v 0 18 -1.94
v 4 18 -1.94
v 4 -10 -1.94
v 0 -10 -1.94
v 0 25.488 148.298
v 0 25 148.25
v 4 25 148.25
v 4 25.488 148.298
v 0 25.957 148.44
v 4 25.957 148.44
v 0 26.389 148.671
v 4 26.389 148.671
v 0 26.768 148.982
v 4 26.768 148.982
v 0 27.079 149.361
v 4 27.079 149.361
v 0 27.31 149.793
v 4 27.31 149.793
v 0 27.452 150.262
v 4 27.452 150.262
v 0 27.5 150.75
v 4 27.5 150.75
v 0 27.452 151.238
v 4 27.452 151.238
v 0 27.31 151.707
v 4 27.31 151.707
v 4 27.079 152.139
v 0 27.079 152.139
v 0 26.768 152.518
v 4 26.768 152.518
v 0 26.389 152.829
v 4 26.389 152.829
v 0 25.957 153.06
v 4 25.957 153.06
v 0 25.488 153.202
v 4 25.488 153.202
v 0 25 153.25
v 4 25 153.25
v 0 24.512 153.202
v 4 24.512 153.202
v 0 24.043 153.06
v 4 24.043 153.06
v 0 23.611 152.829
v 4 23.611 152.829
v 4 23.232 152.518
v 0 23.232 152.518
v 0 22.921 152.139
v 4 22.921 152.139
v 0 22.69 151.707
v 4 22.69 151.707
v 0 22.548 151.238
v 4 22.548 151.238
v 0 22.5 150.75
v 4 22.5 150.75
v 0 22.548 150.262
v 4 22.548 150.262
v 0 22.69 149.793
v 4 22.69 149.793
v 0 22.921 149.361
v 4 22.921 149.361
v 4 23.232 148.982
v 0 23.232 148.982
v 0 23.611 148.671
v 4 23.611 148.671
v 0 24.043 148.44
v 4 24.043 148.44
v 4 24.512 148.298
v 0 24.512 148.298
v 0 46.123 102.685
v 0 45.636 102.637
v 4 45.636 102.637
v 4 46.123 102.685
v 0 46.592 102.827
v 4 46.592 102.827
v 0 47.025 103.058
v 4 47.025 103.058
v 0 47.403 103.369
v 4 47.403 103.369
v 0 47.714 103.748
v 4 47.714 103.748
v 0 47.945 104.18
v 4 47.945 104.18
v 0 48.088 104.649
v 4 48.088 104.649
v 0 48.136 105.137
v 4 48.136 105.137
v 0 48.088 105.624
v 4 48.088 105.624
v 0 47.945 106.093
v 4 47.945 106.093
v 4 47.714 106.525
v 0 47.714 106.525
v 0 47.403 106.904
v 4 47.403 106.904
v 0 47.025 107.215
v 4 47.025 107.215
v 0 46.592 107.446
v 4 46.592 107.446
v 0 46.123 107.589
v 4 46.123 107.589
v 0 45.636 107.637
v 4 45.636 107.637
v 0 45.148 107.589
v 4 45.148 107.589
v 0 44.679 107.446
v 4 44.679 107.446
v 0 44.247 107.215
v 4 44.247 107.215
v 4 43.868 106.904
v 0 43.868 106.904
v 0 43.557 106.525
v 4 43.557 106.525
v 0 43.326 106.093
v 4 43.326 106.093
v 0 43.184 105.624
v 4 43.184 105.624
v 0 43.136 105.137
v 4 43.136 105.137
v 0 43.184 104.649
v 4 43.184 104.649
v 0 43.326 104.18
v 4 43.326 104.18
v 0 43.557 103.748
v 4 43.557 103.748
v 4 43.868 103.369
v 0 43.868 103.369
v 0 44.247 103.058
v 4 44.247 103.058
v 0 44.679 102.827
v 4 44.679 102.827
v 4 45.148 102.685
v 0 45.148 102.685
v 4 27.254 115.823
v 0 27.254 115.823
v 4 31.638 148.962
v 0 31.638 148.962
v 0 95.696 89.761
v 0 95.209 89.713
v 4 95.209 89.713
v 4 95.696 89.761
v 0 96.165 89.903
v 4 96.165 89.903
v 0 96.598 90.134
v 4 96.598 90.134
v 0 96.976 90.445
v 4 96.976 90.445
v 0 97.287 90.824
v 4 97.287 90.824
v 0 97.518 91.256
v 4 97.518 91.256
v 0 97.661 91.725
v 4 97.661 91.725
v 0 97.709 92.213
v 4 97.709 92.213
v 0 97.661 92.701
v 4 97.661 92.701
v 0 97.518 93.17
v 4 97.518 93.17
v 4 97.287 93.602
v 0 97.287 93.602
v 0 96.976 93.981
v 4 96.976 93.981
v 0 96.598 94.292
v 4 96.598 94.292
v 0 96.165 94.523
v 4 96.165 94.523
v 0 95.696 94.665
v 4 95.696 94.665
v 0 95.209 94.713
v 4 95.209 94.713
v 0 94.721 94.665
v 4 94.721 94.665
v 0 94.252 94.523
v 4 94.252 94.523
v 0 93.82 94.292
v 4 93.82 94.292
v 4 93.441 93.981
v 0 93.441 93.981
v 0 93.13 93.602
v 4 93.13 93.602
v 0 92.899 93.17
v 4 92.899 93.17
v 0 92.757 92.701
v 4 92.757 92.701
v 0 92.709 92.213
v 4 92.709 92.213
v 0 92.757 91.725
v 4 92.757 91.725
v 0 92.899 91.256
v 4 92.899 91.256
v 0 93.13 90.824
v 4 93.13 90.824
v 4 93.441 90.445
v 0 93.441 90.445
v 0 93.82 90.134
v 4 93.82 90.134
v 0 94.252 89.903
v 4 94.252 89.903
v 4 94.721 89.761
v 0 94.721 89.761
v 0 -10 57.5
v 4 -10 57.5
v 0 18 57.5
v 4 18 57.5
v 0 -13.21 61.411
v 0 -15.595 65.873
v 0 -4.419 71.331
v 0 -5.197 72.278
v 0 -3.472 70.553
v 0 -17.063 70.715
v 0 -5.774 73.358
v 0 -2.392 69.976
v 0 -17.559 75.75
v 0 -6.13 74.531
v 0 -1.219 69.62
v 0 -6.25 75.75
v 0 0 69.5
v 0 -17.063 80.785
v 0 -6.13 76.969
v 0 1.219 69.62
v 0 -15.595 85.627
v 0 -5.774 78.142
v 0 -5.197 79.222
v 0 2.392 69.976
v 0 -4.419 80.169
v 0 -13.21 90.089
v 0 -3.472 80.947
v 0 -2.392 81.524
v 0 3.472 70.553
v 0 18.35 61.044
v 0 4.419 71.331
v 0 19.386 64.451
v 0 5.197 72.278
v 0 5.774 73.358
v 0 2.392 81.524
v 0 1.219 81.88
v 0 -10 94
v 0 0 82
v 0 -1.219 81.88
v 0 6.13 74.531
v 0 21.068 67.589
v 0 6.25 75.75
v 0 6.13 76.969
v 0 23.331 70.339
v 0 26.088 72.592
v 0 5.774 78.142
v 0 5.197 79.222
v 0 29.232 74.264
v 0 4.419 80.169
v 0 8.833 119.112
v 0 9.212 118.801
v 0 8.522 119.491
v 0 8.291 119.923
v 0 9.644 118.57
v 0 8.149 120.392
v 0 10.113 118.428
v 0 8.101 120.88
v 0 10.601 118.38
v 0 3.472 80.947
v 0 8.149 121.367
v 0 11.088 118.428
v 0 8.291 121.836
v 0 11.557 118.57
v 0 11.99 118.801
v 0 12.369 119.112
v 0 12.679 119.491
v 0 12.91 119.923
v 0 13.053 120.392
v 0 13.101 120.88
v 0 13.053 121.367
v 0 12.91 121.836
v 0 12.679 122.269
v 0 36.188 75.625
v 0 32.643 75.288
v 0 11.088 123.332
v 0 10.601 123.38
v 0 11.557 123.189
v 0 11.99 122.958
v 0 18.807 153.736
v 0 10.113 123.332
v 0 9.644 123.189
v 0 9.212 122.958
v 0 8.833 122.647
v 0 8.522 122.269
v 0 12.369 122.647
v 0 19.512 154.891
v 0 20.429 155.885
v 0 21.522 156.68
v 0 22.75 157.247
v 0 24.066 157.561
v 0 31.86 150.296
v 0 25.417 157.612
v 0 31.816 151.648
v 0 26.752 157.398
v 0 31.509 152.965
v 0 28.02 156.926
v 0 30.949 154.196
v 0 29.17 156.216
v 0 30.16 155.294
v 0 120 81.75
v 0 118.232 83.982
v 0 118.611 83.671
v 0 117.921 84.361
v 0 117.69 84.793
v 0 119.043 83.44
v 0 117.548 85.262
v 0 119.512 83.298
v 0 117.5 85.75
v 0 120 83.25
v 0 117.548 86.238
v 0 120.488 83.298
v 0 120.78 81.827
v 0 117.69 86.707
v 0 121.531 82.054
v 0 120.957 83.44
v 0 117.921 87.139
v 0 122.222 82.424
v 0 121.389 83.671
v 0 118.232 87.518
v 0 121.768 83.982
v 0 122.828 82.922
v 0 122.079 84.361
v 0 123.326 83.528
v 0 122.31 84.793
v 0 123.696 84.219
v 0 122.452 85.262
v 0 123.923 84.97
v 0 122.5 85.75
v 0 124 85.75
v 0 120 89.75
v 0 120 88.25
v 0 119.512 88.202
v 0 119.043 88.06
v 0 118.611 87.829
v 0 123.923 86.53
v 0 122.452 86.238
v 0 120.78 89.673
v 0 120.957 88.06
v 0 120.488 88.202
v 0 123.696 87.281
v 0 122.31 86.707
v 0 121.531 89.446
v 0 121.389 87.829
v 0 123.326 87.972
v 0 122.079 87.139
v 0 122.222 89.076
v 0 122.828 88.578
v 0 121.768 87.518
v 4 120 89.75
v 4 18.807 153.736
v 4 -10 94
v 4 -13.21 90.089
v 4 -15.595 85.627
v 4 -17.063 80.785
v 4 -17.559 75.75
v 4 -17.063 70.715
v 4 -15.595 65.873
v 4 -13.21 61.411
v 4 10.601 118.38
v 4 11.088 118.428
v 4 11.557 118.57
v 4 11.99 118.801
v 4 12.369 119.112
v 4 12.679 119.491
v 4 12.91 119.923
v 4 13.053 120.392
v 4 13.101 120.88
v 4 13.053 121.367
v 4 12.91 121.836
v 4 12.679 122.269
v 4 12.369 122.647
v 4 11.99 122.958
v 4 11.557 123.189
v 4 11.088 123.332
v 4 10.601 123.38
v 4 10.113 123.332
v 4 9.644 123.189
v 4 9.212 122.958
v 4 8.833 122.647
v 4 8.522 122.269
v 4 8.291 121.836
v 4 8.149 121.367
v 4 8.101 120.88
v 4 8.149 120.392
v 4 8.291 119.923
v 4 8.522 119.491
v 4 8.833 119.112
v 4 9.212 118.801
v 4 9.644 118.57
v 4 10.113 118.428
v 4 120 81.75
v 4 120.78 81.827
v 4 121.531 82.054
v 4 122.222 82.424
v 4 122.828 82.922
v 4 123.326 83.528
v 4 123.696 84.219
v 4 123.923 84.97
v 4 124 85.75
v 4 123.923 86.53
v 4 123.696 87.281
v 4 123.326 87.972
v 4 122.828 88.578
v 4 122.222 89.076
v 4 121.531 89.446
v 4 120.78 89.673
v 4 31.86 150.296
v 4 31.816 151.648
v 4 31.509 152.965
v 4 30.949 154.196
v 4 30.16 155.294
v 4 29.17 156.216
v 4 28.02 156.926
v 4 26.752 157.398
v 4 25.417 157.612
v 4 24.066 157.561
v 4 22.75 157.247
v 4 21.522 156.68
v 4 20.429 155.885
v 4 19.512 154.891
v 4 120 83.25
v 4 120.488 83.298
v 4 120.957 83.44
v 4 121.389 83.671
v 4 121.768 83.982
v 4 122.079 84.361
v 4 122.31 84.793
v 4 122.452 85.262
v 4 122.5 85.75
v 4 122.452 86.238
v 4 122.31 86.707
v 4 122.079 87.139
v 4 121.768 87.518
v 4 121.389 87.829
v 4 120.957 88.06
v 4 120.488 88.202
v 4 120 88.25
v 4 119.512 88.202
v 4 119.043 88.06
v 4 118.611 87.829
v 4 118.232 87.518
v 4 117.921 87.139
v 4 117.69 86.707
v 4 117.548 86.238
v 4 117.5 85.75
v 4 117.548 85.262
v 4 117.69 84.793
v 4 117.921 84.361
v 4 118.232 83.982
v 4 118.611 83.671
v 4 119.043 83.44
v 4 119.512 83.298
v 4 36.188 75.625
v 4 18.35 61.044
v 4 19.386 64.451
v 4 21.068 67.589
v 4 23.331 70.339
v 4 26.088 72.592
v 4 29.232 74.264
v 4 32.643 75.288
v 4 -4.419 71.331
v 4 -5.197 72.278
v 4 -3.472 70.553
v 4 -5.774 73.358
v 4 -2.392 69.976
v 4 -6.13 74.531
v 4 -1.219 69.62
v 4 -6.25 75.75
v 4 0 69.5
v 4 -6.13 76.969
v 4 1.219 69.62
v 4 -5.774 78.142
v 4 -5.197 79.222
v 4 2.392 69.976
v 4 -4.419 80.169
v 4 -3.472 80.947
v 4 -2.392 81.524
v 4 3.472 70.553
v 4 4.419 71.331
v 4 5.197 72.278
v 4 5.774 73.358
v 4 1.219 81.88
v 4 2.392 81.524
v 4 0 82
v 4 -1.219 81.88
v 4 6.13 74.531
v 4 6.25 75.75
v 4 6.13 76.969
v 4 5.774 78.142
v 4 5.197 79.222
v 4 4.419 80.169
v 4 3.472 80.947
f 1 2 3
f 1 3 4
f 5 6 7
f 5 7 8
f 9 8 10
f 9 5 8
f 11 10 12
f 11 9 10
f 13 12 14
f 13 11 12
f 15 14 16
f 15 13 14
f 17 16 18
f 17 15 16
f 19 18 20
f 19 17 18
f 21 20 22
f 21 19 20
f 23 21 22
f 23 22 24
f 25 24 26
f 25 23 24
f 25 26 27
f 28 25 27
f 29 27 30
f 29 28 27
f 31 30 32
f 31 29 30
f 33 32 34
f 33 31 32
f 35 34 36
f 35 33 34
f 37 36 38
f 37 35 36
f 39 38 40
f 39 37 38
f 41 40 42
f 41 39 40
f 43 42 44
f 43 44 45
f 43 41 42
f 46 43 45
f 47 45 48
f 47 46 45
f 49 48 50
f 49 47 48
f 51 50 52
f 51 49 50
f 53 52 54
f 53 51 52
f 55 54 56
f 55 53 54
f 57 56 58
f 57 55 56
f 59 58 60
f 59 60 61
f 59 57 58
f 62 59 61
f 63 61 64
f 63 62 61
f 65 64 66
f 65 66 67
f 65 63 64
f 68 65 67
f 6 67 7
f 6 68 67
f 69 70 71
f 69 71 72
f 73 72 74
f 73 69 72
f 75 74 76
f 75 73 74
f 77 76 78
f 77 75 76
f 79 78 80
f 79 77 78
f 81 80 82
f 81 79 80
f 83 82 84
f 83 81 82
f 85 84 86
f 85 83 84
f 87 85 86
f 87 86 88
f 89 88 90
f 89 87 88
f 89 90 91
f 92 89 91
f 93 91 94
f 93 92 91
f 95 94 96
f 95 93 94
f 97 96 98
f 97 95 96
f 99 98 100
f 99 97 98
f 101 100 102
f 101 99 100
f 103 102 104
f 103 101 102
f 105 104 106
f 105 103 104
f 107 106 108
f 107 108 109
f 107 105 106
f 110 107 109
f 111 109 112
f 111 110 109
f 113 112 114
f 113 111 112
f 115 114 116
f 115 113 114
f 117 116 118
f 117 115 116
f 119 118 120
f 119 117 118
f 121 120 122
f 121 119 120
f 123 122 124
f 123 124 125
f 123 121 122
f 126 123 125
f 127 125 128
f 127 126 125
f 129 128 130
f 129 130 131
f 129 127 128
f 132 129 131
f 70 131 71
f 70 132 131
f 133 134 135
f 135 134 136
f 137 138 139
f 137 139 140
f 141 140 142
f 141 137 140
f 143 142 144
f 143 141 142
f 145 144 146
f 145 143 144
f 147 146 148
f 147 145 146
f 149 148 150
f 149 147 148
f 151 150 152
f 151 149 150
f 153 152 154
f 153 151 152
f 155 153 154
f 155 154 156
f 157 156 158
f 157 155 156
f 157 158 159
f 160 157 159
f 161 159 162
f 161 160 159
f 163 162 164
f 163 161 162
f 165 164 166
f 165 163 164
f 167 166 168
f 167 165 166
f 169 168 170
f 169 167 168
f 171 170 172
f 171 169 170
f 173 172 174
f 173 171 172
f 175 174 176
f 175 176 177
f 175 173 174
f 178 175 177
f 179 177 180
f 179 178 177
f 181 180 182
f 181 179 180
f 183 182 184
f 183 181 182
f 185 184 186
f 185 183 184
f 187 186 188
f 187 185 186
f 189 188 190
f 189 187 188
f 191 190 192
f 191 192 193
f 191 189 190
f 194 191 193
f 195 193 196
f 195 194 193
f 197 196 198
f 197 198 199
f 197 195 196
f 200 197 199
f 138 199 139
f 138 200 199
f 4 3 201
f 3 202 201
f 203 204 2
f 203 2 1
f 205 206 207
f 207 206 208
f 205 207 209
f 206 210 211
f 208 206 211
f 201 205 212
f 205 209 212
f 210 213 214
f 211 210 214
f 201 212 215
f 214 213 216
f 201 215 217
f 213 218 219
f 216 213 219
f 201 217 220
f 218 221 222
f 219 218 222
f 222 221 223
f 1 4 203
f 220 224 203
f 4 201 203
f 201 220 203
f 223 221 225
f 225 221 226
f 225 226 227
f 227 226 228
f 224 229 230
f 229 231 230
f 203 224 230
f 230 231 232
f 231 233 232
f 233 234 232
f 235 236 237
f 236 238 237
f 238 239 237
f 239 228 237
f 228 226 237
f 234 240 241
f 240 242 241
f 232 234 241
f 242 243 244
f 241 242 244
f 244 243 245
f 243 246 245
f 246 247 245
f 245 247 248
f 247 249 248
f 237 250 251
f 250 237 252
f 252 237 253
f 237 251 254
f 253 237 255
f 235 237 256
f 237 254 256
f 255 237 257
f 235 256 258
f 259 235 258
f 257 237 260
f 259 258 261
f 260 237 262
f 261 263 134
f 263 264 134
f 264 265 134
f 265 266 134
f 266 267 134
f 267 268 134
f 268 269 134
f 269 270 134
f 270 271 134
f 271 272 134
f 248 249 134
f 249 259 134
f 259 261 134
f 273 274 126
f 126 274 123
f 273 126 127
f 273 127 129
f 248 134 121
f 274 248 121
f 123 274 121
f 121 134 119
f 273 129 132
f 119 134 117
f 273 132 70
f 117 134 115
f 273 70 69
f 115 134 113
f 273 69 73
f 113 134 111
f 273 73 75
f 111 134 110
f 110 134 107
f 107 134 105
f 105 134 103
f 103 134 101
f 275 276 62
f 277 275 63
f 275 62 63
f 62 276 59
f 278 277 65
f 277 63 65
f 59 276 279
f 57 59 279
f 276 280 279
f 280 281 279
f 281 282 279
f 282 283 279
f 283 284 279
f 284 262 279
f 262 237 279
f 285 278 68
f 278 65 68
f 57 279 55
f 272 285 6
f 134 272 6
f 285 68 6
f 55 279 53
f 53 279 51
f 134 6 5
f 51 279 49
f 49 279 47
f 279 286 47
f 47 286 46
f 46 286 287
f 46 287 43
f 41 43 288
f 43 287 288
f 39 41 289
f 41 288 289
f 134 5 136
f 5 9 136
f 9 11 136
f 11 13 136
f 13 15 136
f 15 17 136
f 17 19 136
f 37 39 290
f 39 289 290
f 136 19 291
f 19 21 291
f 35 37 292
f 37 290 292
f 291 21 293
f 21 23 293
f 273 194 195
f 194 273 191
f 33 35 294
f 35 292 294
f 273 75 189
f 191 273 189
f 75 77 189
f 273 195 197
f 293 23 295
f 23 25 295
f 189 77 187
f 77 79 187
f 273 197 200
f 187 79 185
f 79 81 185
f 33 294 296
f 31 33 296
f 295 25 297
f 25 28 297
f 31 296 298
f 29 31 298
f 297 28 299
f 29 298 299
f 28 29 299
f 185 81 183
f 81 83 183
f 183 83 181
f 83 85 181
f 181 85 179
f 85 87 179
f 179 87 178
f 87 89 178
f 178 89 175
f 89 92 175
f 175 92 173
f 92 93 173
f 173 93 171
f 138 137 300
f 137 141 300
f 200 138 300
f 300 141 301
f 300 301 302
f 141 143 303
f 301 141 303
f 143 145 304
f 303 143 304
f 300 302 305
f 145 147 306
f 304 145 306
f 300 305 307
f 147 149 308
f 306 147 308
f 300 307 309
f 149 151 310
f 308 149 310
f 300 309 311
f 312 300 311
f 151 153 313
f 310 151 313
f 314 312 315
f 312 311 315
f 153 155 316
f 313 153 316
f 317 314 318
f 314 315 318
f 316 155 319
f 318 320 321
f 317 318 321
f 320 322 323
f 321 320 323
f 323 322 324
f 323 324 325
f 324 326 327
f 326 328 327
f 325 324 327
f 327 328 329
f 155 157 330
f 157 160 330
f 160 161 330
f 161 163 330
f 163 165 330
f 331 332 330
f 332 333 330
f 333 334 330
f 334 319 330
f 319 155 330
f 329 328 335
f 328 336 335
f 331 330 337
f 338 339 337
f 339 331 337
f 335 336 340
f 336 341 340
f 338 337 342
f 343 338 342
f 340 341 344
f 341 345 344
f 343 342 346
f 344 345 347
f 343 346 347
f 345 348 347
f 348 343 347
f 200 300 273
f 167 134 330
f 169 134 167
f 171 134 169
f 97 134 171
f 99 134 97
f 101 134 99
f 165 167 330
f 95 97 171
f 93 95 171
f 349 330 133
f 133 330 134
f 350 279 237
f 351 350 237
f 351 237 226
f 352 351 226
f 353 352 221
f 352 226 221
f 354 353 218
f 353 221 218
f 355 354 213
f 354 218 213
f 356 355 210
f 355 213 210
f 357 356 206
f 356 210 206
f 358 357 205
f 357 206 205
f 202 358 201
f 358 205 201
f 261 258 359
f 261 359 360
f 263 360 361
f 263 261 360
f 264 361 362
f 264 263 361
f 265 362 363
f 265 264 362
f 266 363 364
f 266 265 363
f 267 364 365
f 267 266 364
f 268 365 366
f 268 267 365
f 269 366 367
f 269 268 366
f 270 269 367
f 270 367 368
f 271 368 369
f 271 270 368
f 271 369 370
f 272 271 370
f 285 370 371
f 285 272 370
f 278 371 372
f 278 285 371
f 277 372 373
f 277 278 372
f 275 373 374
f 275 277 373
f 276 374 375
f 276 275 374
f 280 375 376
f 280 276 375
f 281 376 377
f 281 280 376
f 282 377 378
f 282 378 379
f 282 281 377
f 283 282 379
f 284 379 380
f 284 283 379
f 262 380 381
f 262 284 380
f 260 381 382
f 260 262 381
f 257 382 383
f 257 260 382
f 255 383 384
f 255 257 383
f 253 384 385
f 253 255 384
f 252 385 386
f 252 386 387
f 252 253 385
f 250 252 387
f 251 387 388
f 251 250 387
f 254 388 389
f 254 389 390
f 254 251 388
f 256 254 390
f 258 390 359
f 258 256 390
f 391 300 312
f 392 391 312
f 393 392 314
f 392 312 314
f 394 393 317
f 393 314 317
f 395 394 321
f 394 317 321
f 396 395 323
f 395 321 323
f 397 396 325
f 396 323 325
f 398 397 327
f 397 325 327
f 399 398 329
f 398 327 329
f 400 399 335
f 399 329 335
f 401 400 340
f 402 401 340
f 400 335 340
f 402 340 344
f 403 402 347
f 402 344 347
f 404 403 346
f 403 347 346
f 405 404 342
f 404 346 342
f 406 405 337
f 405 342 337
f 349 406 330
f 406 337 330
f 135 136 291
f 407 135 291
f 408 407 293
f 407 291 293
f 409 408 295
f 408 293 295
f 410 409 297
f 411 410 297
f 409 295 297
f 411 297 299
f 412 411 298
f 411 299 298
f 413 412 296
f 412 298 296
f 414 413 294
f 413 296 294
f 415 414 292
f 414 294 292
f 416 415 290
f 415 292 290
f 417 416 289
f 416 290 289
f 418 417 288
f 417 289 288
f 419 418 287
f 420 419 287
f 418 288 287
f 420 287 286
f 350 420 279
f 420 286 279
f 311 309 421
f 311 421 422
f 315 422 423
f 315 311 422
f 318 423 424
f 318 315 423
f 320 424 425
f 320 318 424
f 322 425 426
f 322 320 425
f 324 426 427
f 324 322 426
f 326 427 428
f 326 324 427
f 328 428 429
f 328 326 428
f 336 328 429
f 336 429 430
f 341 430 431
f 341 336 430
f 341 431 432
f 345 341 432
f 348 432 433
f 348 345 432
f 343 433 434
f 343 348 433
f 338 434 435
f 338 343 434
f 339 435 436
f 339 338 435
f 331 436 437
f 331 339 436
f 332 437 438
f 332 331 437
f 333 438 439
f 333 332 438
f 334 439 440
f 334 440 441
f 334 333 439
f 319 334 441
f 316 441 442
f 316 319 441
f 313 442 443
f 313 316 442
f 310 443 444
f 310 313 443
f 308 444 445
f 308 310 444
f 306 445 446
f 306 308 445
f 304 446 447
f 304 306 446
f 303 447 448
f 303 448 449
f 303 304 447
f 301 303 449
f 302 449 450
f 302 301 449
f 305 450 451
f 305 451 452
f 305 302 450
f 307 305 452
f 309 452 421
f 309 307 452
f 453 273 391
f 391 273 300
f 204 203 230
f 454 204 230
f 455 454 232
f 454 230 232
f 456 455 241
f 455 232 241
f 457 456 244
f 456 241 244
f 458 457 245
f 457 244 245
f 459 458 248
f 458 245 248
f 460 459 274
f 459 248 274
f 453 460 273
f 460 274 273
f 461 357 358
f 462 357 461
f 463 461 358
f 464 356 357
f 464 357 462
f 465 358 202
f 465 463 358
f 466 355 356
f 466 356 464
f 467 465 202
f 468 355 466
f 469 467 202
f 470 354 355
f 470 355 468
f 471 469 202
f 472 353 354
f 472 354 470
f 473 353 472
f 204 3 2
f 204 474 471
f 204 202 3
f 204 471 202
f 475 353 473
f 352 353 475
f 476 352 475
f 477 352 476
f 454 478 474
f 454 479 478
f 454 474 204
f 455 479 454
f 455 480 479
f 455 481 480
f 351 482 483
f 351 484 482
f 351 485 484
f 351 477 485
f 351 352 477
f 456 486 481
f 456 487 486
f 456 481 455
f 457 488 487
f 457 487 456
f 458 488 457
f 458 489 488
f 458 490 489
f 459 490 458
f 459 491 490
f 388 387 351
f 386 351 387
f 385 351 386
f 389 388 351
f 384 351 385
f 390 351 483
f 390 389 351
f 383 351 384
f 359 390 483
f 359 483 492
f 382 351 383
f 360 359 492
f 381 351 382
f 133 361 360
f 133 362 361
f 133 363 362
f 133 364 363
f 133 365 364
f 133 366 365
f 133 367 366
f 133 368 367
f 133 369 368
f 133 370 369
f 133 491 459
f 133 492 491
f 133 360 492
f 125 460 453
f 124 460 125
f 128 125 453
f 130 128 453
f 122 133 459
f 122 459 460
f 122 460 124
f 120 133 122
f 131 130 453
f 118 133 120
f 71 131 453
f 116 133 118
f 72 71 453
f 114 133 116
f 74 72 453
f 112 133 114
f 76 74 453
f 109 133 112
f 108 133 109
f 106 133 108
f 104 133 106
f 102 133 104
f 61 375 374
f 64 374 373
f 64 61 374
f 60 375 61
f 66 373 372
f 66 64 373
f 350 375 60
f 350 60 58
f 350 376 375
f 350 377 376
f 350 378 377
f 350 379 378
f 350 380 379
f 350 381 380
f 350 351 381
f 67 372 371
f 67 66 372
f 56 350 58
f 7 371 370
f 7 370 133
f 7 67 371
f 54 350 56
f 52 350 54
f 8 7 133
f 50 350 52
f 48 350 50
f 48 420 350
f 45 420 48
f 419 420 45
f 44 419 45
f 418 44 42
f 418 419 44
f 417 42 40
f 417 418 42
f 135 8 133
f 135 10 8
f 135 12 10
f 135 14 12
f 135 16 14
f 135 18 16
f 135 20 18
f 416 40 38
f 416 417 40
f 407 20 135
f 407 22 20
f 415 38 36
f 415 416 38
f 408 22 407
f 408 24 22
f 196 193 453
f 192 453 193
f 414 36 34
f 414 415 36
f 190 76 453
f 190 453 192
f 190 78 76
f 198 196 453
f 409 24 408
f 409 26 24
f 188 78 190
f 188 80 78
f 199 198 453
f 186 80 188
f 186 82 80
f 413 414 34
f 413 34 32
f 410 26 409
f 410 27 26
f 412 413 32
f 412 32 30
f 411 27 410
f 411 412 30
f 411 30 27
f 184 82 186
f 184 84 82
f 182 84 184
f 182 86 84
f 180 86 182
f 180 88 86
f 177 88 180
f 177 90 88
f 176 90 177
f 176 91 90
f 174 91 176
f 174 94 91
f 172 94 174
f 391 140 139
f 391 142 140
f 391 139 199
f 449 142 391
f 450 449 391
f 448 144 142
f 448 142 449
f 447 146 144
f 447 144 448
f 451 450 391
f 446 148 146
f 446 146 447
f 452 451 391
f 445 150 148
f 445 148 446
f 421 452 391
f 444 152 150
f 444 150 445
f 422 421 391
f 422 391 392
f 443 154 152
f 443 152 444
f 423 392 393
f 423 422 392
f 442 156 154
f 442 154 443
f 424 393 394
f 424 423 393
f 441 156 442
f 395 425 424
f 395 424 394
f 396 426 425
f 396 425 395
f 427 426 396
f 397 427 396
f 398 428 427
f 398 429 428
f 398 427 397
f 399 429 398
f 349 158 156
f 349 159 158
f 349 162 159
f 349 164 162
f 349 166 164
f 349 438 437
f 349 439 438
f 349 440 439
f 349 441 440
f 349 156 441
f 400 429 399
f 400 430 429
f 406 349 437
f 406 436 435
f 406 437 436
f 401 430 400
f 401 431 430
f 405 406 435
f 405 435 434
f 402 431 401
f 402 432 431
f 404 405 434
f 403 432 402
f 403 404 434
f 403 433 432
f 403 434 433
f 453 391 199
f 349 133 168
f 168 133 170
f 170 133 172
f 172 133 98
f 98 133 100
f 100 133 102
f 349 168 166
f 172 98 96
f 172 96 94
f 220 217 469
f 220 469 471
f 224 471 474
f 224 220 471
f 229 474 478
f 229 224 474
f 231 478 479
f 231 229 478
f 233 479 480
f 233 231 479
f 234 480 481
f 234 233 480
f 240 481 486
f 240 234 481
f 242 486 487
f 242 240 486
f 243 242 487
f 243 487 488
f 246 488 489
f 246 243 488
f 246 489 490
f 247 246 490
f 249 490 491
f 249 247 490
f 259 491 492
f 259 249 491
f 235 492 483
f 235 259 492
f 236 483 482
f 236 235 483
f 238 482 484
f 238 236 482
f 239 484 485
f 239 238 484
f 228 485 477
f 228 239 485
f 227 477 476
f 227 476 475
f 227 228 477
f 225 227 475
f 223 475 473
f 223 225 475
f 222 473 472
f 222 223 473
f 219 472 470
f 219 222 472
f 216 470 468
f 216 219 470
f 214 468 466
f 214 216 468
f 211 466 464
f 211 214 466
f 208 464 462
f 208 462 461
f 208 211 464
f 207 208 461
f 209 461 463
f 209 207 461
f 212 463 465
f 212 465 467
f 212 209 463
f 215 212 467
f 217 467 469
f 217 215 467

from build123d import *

# Parameters (mm, degrees)
SKETCH1_R           = 2.5
SKETCH1_R_2         = 6.25
BOSS_EXTRUDE1_DEPTH = 4
SKETCH2_W           = 4
SKETCH2_H           = 28
BOSS_EXTRUDE2_DEPTH = 1.94


with BuildPart() as part:
    # Sketch1 → Boss-Extrude1 (new body)
    with BuildSketch(Plane(origin=(0, 0, 0), x_dir=(0, 0, -1), z_dir=(1, 0, 0))):
        with BuildLine():
            ThreePointArc((-57.5, 18), (-70.338674346, 23.330913022), (-75.625323458, 36.187877429))
            Line((-75.625323458, 36.187877429), (-81.75, 120))
            ThreePointArc((-81.75, 120), (-85.75, 124), (-89.75, 120))
            Line((-89.75, 120), (-115.82263113, 27.253642352))
            Line((-115.82263113, 27.253642352), (-148.961993572, 31.638422856))
            ThreePointArc((-148.961993572, 31.638422856), (-157.193398915, 27.397547793), (-153.736313474, 18.807459581))
            Line((-153.736313474, 18.807459581), (-94, -10))
            ThreePointArc((-94, -10), (-75.75, -17.559397513), (-57.5, -10))
            Line((-57.5, -10), (0, -10))
            Line((0, -10), (0, 18))
            Line((0, 18), (-57.5, 18))
        make_face()
        with Locations((-150.75, 25)):
            Circle(SKETCH1_R, mode=Mode.SUBTRACT)
        with Locations((-120.879671399, 10.600773875)):
            Circle(SKETCH1_R, mode=Mode.SUBTRACT)
        with Locations((-75.75, 0)):
            Circle(SKETCH1_R_2, mode=Mode.SUBTRACT)
        with Locations((-105.136571318, 45.63560228)):
            Circle(SKETCH1_R, mode=Mode.SUBTRACT)
        with Locations((-92.213009764, 95.208724602)):
            Circle(SKETCH1_R, mode=Mode.SUBTRACT)
        with Locations((-85.75, 120)):
            Circle(SKETCH1_R, mode=Mode.SUBTRACT)
    extrude(amount=BOSS_EXTRUDE1_DEPTH)

    # Sketch2 → Boss-Extrude2 (add)
    with BuildSketch(Plane(origin=(0, 0, 0), x_dir=(-1, 0, 0), z_dir=(0, 0, -1))):
        with Locations((-2, 4)):
            Rectangle(SKETCH2_W, SKETCH2_H)
    extrude(amount=BOSS_EXTRUDE2_DEPTH)


solid = part.part
